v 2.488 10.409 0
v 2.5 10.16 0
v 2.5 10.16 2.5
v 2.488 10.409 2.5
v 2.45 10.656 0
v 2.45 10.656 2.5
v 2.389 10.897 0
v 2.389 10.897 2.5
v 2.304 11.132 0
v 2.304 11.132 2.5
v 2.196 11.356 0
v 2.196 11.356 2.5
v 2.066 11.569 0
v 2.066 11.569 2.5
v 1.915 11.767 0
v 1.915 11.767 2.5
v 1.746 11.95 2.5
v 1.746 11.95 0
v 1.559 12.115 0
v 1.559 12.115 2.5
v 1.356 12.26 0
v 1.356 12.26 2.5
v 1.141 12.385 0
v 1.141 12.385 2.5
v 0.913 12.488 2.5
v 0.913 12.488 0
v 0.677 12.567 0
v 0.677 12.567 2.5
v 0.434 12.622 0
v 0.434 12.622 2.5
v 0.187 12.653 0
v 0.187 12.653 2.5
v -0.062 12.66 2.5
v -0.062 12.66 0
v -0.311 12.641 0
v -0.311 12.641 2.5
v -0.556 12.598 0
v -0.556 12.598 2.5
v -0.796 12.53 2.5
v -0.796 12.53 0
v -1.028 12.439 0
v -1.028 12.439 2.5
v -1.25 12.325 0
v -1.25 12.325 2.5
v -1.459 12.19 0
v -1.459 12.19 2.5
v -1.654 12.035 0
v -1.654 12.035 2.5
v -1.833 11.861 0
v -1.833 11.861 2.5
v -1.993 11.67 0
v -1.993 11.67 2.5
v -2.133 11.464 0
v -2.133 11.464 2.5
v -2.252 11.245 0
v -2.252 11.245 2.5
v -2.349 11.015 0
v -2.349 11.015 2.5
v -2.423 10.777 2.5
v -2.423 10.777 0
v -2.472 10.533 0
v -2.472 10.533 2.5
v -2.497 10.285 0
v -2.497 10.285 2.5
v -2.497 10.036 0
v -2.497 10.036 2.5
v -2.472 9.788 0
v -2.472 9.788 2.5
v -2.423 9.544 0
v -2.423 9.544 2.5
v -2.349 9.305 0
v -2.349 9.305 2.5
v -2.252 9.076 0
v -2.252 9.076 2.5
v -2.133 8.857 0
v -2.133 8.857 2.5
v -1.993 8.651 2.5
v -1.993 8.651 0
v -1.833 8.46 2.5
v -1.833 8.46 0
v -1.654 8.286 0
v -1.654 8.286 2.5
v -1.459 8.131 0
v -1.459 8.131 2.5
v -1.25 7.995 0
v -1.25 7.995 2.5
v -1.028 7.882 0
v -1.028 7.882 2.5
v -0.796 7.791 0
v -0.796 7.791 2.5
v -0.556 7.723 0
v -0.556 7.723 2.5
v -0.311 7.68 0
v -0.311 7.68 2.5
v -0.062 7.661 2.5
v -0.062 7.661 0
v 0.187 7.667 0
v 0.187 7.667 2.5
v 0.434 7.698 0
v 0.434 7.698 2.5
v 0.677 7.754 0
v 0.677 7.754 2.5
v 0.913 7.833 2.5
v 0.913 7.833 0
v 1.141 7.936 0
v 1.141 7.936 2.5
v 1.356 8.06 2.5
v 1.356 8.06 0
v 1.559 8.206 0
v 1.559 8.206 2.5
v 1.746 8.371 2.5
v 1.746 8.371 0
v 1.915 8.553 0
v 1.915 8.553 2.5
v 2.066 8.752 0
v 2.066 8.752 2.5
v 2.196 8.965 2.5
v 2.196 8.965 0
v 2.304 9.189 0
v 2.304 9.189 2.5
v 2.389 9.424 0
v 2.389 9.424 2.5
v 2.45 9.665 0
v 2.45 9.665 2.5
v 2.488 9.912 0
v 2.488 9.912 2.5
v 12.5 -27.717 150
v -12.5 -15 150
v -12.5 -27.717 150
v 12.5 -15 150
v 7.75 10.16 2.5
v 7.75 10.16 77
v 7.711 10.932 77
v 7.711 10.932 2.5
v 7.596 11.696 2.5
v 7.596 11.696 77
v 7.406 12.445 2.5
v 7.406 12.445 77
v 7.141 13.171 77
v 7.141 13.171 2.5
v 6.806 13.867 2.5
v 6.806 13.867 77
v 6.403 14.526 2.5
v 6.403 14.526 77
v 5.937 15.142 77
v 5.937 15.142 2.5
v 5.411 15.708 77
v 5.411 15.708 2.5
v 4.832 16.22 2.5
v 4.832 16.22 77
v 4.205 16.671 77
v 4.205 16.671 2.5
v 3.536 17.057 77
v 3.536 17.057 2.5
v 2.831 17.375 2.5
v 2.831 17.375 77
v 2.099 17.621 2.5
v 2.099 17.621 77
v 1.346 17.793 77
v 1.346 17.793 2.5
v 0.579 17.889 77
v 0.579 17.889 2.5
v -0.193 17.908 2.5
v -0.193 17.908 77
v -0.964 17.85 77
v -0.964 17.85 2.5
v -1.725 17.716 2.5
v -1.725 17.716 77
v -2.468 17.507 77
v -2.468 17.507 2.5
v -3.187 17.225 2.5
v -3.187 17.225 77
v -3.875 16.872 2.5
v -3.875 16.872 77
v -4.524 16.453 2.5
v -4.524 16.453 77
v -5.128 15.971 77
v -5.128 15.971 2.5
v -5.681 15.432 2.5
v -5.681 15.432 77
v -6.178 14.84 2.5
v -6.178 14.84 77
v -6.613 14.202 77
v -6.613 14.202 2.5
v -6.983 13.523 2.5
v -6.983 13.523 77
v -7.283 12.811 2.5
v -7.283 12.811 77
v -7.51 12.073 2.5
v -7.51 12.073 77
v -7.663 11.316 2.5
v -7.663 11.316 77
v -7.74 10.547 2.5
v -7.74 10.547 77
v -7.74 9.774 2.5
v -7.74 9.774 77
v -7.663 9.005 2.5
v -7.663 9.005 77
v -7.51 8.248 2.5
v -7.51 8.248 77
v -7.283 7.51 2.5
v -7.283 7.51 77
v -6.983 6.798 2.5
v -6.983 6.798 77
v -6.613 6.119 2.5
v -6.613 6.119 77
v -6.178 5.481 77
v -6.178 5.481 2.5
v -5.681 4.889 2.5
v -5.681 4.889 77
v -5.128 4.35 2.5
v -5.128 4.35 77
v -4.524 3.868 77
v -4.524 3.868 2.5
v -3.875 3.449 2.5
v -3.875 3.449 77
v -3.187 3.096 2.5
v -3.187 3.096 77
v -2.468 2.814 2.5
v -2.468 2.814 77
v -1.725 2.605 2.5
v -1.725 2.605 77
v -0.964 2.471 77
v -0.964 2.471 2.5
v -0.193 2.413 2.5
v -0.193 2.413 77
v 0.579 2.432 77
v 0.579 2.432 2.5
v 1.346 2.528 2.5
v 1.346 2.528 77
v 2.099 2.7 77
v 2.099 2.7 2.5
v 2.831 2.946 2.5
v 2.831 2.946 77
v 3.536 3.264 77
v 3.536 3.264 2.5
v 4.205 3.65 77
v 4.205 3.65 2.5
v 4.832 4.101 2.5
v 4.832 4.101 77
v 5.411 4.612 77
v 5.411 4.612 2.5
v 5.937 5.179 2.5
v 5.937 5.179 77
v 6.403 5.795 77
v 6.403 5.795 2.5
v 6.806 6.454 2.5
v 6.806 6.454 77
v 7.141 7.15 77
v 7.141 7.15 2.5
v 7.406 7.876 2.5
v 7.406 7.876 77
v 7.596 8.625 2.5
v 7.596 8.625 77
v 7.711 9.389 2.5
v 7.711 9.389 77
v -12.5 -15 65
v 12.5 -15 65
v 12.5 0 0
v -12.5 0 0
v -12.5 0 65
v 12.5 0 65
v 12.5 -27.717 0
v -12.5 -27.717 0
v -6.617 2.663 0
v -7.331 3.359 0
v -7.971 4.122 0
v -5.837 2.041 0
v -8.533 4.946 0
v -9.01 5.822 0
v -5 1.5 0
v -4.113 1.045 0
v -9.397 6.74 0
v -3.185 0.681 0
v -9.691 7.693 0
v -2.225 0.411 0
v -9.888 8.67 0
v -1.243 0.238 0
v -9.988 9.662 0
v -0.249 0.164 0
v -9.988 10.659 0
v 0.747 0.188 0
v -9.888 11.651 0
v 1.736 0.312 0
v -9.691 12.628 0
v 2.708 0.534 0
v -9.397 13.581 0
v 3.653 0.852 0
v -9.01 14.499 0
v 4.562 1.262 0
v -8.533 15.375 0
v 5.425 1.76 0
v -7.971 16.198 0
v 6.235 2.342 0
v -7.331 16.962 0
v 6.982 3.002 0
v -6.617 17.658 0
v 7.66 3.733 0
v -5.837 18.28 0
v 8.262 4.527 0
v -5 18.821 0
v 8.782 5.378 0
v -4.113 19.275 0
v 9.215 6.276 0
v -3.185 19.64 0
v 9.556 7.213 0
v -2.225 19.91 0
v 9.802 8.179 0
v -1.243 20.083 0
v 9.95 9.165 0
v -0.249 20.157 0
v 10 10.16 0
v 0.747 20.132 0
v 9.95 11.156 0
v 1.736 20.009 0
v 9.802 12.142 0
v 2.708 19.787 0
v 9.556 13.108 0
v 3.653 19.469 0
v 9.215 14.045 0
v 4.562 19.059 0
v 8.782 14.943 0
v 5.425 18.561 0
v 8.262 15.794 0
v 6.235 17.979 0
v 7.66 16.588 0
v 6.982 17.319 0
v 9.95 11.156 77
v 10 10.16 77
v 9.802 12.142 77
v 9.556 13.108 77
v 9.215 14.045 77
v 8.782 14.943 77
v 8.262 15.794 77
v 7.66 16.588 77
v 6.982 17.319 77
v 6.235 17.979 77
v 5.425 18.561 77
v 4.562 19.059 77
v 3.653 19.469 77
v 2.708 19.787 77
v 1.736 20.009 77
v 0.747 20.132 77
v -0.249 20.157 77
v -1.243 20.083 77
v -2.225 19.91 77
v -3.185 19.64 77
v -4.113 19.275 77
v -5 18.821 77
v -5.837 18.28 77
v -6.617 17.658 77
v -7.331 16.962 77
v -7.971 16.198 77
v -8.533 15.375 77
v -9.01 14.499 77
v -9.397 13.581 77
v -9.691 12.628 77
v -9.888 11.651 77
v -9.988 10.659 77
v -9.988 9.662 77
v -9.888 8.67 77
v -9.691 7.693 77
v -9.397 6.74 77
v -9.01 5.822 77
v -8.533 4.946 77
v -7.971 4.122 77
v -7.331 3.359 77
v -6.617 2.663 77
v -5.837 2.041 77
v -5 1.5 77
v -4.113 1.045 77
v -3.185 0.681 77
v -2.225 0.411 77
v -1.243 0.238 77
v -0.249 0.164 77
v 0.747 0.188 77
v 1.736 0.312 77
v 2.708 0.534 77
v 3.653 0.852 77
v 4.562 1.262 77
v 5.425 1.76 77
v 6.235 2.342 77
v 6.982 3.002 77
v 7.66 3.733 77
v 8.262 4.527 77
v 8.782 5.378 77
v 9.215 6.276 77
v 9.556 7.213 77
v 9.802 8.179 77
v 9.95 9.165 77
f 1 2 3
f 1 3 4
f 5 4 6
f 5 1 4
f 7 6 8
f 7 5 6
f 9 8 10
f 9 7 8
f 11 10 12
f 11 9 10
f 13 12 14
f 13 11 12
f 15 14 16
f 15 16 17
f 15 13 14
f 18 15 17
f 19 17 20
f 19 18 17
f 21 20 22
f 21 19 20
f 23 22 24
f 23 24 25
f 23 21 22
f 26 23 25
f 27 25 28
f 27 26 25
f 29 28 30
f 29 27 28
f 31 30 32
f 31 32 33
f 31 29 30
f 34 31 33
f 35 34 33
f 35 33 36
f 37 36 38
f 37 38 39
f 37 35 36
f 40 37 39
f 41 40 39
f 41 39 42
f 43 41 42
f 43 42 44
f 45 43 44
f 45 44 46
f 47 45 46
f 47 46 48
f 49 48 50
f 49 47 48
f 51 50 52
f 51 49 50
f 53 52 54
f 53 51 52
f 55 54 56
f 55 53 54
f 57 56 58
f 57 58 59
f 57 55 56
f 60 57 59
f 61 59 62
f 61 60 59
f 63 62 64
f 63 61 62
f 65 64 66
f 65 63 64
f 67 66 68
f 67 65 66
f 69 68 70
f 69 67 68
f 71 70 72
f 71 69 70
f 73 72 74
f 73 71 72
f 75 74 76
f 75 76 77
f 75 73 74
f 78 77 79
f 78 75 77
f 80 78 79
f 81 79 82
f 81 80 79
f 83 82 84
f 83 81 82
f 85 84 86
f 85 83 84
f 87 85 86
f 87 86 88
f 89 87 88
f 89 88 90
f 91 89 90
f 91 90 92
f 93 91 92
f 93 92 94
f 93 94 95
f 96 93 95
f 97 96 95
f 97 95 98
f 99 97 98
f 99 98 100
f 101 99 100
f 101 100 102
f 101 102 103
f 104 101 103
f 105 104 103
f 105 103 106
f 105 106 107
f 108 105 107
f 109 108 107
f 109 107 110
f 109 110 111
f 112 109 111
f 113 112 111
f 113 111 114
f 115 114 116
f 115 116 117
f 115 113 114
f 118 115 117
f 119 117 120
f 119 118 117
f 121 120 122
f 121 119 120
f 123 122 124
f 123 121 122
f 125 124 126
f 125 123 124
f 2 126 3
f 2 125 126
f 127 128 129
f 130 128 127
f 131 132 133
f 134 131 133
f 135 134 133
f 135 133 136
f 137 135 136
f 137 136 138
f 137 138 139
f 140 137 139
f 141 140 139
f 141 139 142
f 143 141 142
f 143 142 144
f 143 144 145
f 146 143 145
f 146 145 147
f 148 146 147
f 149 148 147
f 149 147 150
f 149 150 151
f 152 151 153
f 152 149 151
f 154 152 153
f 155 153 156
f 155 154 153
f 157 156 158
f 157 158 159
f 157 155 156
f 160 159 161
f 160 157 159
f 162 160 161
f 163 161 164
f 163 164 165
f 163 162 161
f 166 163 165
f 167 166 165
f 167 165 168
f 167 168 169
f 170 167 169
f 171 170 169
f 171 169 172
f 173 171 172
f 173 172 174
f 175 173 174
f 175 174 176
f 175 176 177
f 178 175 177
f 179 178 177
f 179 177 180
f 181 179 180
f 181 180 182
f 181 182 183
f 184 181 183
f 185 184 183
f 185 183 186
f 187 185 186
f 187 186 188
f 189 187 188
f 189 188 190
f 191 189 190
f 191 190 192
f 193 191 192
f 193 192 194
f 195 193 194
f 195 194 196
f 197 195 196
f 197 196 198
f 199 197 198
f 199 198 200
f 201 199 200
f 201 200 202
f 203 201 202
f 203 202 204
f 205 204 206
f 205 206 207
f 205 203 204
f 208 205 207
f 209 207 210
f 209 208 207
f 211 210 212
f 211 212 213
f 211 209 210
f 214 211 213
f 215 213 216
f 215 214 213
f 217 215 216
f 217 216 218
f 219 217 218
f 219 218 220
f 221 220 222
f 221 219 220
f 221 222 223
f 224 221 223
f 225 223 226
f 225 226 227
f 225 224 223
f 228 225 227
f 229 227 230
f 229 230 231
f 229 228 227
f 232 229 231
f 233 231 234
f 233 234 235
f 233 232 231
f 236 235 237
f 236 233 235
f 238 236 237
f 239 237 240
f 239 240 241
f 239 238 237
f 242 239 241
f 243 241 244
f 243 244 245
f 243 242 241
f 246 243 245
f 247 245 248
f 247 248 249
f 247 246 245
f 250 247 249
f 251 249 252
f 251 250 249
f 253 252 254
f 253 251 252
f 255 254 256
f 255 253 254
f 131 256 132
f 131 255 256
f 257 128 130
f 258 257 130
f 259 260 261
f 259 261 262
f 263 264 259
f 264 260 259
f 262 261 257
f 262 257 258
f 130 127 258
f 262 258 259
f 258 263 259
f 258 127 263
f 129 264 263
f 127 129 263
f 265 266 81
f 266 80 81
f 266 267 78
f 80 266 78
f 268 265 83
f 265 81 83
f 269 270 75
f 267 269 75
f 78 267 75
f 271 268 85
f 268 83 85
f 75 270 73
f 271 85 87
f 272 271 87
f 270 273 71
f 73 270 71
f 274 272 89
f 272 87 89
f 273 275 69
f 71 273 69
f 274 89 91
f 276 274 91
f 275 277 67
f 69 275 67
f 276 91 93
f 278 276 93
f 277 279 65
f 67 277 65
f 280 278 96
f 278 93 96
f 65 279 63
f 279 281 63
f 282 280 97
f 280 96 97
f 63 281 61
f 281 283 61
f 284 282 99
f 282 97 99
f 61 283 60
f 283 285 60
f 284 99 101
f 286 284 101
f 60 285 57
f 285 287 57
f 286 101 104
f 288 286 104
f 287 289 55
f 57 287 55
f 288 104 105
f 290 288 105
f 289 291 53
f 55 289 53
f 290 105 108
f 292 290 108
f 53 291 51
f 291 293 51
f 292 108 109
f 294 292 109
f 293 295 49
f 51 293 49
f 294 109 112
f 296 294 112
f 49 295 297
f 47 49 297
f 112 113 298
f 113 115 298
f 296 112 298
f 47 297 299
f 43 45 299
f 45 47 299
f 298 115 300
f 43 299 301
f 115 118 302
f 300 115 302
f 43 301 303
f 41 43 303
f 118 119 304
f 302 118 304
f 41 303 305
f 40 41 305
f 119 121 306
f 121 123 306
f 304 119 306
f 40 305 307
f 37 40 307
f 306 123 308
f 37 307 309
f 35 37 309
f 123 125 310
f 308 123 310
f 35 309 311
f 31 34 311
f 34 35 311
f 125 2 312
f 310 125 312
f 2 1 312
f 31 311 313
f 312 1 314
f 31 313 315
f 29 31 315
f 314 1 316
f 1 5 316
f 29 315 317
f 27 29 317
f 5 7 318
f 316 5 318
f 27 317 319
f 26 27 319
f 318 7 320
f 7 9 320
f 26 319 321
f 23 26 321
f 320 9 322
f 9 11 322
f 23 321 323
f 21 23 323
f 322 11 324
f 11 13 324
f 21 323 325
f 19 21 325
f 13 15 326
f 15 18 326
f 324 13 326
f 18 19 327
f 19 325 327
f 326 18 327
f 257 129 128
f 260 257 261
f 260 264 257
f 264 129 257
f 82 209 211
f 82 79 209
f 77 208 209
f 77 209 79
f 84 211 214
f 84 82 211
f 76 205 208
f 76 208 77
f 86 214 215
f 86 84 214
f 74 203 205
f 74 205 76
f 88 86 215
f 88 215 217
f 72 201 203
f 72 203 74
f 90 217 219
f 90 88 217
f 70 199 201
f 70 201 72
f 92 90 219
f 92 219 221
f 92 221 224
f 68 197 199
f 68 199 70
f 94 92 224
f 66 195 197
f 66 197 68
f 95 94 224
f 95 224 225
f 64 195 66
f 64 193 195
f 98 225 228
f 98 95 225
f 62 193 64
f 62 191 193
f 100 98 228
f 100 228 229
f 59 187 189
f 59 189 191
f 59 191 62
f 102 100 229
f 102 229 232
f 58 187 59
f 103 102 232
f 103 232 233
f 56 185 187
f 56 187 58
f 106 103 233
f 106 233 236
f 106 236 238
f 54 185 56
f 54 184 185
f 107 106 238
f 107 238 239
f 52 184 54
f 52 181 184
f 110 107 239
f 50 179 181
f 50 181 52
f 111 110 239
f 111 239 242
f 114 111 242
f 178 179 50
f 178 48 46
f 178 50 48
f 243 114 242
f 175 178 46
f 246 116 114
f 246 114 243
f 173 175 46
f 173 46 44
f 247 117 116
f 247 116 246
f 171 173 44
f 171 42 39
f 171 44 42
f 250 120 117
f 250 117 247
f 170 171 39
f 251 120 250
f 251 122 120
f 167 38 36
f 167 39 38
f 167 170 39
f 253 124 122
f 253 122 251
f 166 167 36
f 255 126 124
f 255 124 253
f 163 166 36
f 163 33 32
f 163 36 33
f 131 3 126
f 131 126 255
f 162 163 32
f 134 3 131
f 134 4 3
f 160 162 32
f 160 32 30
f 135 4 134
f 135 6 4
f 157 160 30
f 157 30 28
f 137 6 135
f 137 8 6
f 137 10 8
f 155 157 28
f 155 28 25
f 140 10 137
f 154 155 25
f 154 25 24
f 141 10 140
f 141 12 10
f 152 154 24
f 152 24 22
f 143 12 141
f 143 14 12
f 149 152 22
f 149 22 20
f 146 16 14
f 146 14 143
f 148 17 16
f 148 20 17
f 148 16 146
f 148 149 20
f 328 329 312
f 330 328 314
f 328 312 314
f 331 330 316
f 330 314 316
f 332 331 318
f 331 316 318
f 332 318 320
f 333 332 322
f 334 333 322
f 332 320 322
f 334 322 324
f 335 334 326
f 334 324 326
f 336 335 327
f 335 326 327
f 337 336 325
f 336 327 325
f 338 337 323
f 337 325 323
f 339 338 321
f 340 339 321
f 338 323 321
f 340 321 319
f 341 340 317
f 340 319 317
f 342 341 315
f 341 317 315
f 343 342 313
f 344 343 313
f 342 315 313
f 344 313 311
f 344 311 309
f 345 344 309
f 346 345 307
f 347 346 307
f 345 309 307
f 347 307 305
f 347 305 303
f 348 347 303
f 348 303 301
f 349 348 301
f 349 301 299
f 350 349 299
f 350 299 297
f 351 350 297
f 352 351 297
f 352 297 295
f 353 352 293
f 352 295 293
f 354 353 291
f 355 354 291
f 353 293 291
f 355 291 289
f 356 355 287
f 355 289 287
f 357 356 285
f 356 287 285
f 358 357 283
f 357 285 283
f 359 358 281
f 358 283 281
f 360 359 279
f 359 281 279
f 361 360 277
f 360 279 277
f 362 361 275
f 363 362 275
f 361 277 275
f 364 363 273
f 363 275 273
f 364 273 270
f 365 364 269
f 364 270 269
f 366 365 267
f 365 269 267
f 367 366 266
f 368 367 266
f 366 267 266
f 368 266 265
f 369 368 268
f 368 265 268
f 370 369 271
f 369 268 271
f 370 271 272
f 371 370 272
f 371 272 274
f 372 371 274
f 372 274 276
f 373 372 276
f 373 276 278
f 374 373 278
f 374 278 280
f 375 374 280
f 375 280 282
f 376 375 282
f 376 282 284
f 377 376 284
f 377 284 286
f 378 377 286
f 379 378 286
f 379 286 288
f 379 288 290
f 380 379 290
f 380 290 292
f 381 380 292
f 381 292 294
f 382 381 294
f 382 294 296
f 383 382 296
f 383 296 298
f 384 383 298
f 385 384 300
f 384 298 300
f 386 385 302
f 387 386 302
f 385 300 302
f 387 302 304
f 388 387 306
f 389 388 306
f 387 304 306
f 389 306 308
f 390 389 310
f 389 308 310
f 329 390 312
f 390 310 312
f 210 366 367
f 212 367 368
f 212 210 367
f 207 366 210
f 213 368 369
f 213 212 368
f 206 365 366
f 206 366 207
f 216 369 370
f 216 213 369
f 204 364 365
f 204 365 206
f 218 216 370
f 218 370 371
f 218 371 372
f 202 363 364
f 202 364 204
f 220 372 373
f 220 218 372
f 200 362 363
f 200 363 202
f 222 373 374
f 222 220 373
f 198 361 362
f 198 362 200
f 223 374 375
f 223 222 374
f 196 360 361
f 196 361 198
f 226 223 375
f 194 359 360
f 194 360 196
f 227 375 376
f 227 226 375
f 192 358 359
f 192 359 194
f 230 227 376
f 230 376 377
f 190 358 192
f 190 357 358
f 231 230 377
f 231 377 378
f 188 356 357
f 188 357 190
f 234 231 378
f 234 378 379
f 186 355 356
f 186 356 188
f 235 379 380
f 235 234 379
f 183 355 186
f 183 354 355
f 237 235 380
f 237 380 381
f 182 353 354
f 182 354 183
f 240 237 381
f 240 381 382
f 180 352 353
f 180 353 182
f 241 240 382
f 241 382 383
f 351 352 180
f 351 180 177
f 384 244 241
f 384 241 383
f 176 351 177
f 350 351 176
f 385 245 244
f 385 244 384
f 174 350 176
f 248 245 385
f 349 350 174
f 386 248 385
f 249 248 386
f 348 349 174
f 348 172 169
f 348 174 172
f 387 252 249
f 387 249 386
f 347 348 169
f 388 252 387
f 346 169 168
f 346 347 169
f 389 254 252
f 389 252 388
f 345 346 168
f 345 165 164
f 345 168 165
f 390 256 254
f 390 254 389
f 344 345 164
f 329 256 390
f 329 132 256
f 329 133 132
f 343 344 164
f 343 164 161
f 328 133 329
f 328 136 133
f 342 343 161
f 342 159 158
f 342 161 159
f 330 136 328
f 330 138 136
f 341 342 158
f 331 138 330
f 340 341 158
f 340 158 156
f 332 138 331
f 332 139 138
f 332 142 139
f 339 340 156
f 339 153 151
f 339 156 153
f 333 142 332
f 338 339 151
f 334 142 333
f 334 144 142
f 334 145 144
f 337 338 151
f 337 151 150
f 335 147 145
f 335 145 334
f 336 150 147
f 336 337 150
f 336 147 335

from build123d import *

# Parameters (mm, degrees)
SKETCH1_R           = 7.75
SKETCH1_R_2         = 2.5
BOSS_EXTRUDE1_DEPTH = 2.5
SKETCH1_3_R         = 10
SKETCH1_3_R_2       = 7.75
BOSS_EXTRUDE2_DEPTH = 77
SKETCH1_4_W         = 25
SKETCH1_4_H         = 15
BOSS_EXTRUDE3_DEPTH = 65
SKETCH1_5_W         = 25
SKETCH1_5_H         = 12.716539713
BOSS_EXTRUDE4_DEPTH = 150


with BuildPart() as part:
    # Sketch1 → Boss-Extrude1 (new body)
    with BuildSketch(Plane.XY):
        with Locations((0, 10.160427276)):
            Circle(SKETCH1_R)
        with Locations((0, 10.160427276)):
            Circle(SKETCH1_R_2, mode=Mode.SUBTRACT)
    extrude(amount=BOSS_EXTRUDE1_DEPTH)

    # Sketch1_3 → Boss-Extrude2 (add)
    with BuildSketch(Plane.XY):
        with Locations((0, 10.160427276)):
            Circle(SKETCH1_3_R)
        with Locations((0, 10.160427276)):
            Circle(SKETCH1_3_R_2, mode=Mode.SUBTRACT)
    extrude(amount=BOSS_EXTRUDE2_DEPTH)


with BuildPart() as body_2:
    # Sketch1_4 → Boss-Extrude3 (new body)
    with BuildSketch(Plane.XY):
        with Locations((0, -7.5)):
            Rectangle(SKETCH1_4_W, SKETCH1_4_H)
    extrude(amount=BOSS_EXTRUDE3_DEPTH)

    # Sketch1_5 → Boss-Extrude4 (add)
    with BuildSketch(Plane.XY):
        with Locations((0, -21.358269857)):
            Rectangle(SKETCH1_5_W, SKETCH1_5_H)
    extrude(amount=BOSS_EXTRUDE4_DEPTH)


solid = Compound([part.part, body_2.part])
